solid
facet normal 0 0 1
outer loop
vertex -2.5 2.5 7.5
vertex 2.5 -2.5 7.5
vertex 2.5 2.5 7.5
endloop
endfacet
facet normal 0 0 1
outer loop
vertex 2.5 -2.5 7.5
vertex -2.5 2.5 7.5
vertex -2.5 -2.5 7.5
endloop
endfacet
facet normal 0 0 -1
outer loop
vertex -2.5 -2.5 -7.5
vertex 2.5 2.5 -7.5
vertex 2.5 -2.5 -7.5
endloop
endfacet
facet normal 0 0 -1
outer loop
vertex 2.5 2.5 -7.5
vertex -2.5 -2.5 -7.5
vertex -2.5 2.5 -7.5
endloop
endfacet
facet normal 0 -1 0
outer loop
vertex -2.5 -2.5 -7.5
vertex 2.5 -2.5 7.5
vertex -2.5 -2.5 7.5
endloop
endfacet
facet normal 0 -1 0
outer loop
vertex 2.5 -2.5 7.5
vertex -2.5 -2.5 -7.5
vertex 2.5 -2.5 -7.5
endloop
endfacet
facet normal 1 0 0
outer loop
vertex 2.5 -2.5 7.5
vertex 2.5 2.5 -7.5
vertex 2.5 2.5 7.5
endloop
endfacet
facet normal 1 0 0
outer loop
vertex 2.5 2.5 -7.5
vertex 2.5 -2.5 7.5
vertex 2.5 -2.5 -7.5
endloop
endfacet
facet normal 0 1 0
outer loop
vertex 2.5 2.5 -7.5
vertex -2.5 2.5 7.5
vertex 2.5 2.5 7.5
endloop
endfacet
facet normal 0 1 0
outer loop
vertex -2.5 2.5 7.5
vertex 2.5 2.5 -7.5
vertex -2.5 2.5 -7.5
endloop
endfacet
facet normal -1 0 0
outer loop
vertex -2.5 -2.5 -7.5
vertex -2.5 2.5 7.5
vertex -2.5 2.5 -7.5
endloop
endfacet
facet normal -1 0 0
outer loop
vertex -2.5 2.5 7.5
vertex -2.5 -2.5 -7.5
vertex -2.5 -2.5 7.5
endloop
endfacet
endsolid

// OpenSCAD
// Generated by generate_scads.py
cube(size=[5,5,15], center=true);
